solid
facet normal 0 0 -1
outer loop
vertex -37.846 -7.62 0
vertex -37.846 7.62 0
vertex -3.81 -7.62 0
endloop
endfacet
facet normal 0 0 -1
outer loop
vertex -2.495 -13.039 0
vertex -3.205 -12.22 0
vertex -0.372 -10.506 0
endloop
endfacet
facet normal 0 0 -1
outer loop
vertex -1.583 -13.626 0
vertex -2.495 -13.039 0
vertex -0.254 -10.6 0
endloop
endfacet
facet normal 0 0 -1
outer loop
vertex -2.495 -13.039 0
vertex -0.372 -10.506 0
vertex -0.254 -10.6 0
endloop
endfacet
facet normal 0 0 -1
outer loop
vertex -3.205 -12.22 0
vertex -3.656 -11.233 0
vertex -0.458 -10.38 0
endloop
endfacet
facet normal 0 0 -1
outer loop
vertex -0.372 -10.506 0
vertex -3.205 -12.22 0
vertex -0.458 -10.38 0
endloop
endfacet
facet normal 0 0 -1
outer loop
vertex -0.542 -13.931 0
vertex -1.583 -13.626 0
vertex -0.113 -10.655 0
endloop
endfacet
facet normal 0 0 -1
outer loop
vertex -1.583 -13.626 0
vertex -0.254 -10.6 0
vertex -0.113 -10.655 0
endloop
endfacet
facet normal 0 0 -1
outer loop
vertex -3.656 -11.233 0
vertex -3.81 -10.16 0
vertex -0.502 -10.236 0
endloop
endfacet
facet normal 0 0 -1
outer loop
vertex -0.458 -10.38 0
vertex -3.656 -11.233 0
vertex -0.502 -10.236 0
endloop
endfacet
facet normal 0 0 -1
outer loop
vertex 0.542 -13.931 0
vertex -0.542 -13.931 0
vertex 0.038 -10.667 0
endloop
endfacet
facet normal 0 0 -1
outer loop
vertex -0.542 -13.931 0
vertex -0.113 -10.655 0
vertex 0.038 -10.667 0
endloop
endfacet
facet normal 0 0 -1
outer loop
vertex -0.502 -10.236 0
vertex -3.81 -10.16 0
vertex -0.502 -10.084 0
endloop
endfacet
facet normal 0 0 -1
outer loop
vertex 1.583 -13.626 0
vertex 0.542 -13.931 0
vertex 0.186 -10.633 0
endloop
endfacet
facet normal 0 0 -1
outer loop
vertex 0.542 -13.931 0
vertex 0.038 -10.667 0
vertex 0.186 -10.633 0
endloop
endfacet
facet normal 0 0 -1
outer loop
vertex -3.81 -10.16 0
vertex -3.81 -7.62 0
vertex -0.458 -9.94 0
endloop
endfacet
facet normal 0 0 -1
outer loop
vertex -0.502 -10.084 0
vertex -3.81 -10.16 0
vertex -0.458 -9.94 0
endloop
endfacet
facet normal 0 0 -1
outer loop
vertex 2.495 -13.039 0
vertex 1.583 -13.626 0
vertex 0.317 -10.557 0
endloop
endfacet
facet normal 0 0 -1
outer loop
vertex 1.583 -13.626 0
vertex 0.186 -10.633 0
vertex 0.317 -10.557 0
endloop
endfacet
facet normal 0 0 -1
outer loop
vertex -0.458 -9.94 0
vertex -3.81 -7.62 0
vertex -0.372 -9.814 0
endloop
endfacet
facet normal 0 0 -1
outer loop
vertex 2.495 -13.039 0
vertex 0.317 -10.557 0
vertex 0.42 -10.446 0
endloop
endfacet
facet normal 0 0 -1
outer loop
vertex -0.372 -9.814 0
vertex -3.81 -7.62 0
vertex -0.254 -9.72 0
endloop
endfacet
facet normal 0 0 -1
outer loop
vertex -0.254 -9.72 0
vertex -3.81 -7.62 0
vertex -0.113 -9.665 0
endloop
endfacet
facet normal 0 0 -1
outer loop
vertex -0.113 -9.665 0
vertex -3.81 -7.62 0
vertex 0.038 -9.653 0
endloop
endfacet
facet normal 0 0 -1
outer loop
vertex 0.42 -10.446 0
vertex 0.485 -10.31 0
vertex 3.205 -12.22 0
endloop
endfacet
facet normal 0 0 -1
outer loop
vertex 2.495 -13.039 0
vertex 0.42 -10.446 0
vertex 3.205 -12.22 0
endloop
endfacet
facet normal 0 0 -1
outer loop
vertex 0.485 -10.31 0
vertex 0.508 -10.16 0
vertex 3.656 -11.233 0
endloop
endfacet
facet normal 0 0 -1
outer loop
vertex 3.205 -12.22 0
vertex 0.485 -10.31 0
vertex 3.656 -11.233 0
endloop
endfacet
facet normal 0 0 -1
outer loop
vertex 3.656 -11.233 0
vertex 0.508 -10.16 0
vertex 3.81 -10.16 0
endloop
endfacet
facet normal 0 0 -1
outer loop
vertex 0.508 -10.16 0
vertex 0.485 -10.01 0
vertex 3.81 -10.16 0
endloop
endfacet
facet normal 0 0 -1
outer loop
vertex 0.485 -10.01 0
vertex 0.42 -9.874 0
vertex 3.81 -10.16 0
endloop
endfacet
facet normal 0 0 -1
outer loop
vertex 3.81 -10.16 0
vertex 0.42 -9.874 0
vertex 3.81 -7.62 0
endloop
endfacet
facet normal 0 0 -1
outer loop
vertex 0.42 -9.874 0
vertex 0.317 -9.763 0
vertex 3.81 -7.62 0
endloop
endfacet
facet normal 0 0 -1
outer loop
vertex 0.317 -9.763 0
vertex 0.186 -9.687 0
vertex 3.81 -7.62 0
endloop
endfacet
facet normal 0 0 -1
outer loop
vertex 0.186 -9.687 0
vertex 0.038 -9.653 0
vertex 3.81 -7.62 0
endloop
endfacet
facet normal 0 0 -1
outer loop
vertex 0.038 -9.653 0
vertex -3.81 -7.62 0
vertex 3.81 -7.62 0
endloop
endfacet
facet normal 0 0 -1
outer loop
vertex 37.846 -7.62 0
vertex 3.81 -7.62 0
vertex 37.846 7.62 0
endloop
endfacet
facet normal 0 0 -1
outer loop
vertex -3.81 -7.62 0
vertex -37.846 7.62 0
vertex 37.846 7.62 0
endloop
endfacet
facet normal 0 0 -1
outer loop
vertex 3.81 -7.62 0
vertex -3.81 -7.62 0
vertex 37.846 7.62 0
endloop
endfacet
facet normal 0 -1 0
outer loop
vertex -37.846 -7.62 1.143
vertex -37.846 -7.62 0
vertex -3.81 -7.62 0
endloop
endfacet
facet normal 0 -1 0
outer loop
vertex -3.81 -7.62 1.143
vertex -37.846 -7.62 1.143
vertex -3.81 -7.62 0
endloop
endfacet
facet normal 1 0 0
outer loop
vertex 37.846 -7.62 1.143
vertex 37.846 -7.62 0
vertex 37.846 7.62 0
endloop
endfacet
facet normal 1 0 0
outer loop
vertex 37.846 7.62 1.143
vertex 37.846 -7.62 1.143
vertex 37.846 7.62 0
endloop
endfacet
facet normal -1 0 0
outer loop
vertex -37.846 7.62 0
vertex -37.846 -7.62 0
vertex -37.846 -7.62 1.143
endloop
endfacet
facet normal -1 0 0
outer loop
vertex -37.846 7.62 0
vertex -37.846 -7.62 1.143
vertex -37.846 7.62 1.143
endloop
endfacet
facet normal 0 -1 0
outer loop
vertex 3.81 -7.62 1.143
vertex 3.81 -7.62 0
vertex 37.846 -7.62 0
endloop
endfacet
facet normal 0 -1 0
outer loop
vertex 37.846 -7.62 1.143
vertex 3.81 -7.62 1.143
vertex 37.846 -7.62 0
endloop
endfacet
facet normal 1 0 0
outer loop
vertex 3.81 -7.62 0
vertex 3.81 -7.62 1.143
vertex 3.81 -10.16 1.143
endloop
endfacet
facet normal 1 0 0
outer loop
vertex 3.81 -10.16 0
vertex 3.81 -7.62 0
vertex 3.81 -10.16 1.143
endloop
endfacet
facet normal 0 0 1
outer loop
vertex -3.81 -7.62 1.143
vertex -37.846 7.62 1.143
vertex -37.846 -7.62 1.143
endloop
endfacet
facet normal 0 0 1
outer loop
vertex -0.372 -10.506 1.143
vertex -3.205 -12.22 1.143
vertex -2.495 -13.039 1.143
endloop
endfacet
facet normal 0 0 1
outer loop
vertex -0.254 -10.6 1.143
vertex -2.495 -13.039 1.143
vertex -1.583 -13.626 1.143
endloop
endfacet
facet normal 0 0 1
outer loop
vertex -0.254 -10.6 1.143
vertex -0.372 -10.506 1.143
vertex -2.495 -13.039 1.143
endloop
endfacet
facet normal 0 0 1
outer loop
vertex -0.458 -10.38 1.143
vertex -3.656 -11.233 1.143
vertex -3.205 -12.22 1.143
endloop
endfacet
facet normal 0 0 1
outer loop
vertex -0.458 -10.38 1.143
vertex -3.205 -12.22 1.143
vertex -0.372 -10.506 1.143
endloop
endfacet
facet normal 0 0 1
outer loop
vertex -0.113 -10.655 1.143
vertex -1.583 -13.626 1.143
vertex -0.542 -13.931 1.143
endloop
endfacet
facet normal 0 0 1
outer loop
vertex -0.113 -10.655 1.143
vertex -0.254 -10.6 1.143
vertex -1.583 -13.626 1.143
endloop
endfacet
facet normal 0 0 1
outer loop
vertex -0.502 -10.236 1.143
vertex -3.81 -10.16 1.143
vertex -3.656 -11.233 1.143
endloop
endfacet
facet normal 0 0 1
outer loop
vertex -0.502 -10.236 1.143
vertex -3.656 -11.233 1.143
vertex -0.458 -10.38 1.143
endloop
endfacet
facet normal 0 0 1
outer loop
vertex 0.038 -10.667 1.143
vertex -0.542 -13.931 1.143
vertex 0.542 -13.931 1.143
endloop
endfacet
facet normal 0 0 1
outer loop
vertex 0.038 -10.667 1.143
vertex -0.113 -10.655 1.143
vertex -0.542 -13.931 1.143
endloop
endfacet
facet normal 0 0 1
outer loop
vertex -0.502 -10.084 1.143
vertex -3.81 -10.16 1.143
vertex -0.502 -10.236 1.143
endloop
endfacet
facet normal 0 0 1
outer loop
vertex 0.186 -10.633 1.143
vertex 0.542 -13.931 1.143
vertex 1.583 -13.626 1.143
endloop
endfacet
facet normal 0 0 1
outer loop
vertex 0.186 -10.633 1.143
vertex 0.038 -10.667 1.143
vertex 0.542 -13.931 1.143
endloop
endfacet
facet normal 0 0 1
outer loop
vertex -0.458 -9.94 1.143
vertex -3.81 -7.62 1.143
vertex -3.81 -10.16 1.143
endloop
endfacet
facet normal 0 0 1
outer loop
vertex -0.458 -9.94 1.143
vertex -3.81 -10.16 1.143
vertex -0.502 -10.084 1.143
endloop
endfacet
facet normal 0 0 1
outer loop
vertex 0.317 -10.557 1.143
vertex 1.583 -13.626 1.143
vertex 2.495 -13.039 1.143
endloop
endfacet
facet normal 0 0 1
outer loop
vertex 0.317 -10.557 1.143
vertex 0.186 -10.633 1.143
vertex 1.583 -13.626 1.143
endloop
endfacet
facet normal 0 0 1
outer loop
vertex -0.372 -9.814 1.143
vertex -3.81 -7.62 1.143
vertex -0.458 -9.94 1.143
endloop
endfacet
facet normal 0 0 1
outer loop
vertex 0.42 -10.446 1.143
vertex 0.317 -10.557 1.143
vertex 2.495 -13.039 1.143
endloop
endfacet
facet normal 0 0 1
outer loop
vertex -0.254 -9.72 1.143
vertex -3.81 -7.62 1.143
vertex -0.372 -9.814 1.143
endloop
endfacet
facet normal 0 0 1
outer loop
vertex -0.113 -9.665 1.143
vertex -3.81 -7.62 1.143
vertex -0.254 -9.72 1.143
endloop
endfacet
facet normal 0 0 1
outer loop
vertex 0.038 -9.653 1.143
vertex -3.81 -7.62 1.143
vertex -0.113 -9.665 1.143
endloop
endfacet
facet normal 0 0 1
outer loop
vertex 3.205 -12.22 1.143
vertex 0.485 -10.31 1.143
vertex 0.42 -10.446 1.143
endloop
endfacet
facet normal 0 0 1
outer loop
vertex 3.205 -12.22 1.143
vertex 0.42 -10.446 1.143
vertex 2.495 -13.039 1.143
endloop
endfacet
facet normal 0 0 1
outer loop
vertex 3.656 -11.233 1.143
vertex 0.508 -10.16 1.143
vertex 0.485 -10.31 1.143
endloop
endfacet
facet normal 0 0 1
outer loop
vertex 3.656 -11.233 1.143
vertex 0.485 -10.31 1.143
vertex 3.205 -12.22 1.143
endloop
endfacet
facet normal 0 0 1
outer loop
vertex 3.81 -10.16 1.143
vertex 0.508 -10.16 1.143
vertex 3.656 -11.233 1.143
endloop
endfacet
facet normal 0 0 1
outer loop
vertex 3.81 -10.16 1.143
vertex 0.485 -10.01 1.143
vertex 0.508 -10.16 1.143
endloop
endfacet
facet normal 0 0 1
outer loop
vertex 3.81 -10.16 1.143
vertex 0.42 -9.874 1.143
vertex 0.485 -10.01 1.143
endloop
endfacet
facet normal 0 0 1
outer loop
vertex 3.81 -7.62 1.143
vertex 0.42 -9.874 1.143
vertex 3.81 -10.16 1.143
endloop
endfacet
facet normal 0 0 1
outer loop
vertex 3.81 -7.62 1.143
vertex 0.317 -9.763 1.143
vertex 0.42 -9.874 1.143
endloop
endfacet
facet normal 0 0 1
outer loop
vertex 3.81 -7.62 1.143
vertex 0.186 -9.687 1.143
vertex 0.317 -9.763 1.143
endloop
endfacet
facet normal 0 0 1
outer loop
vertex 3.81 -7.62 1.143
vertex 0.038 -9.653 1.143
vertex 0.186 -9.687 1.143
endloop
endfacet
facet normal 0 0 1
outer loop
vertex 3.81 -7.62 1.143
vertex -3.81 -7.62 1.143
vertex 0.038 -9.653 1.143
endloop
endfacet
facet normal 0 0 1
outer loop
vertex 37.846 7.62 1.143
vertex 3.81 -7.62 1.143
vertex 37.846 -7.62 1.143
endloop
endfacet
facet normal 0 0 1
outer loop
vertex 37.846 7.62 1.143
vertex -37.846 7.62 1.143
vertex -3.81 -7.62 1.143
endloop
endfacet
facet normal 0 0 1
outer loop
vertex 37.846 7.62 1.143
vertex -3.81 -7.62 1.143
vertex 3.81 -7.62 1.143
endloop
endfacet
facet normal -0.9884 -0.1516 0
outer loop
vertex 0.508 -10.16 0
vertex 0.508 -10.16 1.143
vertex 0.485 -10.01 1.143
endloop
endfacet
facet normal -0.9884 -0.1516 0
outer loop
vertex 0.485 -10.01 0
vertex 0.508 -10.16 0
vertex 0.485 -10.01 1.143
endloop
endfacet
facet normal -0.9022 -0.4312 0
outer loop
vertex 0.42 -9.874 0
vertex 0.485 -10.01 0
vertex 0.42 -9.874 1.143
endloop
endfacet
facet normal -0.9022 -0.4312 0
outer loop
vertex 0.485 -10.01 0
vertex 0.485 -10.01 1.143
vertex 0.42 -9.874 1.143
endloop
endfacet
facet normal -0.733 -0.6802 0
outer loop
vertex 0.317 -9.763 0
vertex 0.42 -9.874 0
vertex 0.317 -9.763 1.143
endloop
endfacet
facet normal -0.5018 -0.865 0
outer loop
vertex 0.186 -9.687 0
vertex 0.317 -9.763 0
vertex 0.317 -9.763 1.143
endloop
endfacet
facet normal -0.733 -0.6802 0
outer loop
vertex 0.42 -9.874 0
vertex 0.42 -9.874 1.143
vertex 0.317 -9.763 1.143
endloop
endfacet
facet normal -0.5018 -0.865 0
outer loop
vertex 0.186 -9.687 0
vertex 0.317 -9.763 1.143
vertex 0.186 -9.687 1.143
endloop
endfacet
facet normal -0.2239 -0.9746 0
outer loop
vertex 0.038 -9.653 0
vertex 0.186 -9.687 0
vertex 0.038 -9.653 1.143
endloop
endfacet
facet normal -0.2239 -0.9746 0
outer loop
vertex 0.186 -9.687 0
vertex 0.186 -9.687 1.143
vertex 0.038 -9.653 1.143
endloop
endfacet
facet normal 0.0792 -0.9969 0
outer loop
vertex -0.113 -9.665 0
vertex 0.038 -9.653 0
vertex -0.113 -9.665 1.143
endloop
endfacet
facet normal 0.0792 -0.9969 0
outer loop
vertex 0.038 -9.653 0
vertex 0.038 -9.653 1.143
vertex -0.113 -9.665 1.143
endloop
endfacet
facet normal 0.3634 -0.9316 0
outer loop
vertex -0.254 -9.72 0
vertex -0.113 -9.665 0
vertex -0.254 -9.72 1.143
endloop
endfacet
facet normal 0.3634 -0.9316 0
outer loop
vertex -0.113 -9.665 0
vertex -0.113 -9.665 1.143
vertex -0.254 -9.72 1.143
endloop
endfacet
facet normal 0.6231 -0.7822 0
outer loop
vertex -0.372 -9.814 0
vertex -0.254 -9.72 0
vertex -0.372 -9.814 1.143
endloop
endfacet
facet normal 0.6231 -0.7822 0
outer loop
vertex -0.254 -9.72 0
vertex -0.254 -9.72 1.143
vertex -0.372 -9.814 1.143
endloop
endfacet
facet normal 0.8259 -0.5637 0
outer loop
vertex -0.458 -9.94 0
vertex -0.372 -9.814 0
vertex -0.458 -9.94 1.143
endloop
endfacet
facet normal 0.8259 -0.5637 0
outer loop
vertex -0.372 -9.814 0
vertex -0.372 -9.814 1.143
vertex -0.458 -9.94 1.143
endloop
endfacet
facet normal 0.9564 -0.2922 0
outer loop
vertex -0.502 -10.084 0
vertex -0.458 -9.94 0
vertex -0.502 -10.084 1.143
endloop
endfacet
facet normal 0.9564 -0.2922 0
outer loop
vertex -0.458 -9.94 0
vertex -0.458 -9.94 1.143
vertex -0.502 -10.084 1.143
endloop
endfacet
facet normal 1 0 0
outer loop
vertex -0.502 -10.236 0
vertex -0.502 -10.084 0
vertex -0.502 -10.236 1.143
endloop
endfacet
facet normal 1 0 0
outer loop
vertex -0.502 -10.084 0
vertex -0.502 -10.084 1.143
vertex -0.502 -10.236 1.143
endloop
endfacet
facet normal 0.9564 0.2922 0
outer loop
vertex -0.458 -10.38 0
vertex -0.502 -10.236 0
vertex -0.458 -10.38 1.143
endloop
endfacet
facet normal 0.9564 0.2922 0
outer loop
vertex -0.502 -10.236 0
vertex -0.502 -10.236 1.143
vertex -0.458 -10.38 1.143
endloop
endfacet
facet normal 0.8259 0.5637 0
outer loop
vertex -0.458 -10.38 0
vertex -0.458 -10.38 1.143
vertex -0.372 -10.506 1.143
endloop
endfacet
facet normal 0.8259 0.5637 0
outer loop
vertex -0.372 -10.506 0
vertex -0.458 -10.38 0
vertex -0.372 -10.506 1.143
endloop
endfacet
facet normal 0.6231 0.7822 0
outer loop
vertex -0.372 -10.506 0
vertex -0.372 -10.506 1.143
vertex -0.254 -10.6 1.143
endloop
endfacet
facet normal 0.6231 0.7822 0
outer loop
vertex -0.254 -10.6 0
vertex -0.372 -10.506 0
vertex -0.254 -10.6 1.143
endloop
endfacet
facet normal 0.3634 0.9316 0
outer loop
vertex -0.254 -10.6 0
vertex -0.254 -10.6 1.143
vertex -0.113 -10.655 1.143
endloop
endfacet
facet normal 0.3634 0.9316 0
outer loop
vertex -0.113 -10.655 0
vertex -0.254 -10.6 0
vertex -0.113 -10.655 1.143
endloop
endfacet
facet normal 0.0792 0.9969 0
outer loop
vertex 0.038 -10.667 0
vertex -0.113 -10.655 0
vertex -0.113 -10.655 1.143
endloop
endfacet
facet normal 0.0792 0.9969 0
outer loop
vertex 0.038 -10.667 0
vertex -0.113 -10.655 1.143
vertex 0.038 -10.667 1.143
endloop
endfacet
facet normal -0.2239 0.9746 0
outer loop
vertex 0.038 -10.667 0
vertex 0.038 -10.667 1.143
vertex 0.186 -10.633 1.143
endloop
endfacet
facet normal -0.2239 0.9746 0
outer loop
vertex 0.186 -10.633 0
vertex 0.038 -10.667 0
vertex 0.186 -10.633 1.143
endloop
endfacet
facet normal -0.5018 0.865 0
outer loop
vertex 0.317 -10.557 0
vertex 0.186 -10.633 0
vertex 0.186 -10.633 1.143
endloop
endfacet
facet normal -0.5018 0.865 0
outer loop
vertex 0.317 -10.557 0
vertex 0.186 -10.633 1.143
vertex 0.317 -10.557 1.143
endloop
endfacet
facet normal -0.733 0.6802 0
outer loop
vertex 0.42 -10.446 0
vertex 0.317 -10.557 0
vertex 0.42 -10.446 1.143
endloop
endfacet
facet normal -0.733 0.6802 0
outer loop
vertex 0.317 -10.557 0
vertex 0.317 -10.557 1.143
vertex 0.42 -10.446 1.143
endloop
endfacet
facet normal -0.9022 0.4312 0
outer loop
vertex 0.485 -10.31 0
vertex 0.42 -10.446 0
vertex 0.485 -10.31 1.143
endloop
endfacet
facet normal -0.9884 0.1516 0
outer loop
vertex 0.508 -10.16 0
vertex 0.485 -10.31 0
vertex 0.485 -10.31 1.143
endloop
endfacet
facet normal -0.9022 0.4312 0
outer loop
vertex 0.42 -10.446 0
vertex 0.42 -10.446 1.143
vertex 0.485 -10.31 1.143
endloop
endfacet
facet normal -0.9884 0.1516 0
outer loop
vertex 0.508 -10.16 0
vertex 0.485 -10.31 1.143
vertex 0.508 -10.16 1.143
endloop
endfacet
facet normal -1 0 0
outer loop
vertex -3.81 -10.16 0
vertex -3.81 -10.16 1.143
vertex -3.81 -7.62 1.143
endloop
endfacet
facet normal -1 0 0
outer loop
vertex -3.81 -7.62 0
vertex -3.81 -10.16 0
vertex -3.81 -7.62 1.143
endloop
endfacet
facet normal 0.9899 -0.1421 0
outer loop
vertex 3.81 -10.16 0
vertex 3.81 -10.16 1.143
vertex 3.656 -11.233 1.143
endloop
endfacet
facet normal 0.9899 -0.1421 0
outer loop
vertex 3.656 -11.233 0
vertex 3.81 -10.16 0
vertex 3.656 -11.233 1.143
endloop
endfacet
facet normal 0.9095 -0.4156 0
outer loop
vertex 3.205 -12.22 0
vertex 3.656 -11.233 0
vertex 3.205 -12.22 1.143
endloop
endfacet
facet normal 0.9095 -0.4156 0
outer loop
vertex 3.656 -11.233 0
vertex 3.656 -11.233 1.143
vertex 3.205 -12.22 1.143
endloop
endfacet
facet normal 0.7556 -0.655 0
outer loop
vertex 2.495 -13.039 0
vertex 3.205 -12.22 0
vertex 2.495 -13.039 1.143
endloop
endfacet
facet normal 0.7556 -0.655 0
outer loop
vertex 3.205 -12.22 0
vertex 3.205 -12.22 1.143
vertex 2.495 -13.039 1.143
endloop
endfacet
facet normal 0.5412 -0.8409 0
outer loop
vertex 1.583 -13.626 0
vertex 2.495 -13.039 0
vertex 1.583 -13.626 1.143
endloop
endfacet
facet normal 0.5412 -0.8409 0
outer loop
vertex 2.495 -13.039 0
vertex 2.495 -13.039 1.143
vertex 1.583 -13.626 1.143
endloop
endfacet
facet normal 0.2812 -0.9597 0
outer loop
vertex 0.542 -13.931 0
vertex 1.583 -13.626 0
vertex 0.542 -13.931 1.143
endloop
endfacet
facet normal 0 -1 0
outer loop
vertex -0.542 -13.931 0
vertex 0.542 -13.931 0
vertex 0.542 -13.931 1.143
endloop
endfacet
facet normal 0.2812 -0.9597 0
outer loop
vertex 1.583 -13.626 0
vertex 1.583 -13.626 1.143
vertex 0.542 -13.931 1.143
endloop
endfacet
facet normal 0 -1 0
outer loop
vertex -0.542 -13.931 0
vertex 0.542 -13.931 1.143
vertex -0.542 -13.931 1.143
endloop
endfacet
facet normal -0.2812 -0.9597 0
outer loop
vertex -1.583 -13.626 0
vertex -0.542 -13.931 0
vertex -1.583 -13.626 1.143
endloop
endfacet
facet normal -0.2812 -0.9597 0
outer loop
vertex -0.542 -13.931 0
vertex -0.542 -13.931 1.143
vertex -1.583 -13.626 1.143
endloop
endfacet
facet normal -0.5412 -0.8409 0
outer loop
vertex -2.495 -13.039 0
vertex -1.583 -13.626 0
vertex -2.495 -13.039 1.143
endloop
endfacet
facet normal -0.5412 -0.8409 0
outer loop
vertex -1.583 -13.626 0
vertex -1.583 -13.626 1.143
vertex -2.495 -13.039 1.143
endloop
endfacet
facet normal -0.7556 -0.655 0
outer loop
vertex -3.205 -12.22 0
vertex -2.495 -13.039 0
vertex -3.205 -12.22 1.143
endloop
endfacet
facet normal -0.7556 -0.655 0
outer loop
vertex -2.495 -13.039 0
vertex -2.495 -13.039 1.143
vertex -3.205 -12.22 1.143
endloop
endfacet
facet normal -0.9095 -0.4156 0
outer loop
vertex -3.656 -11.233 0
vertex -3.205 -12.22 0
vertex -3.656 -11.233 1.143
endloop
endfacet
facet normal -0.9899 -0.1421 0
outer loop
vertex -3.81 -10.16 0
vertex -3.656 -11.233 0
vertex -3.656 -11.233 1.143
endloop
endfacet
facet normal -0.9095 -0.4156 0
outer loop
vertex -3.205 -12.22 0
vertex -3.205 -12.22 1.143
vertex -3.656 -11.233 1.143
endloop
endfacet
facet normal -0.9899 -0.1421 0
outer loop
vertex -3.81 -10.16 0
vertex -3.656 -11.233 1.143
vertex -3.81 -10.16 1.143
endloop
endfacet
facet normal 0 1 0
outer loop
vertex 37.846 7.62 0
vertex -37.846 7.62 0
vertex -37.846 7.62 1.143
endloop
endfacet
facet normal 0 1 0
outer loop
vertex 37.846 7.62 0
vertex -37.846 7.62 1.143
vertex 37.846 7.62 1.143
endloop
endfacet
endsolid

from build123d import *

# Parameters (mm, degrees)
SKETCH1_W           = 75.692
SKETCH1_H           = 15.24
BOSS_EXTRUDE1_DEPTH = 1.143
SKETCH2_R           = 0.508
BOSS_EXTRUDE2_DEPTH = 1.143


with BuildPart() as part:
    # Sketch1 → Boss-Extrude1 (new body)
    with BuildSketch(Plane.XY):
        Rectangle(SKETCH1_W, SKETCH1_H)
    extrude(amount=BOSS_EXTRUDE1_DEPTH)

    # Sketch2 → Boss-Extrude2 (add)
    with BuildSketch(Plane.XY.offset(1.143)):
        with BuildLine():
            Line((-3.81, -7.62), (3.81, -7.62))
            Line((3.81, -7.62), (3.81, -10.16))
            ThreePointArc((3.81, -10.16), (0, -13.97), (-3.81, -10.16))
            Line((-3.81, -10.16), (-3.81, -7.62))
        make_face()
        with Locations((0, -10.16)):
            Circle(SKETCH2_R, mode=Mode.SUBTRACT)
    extrude(amount=-BOSS_EXTRUDE2_DEPTH)


solid = part.part
